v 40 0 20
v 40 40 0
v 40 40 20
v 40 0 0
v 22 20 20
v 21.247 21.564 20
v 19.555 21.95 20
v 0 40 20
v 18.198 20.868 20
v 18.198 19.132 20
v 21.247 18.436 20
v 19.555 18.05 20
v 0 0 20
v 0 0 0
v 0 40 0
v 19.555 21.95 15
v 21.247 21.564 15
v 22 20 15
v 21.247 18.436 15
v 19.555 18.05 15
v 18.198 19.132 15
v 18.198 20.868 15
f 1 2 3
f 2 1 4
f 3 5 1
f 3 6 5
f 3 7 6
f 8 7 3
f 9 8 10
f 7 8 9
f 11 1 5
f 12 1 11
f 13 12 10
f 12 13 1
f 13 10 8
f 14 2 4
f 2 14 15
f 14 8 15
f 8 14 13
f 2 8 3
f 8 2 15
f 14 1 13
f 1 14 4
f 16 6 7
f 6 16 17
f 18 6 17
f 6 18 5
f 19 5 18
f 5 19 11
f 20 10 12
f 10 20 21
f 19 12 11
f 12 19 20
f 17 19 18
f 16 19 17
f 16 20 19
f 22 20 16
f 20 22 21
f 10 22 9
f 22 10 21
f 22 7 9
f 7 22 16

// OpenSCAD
size = 40;
height = 20;

difference() {
	cube([size, size, height]);
	translate([size / 2, size / 2, height - 5]) {
		cylinder(r=2, h=6);
	}
}
